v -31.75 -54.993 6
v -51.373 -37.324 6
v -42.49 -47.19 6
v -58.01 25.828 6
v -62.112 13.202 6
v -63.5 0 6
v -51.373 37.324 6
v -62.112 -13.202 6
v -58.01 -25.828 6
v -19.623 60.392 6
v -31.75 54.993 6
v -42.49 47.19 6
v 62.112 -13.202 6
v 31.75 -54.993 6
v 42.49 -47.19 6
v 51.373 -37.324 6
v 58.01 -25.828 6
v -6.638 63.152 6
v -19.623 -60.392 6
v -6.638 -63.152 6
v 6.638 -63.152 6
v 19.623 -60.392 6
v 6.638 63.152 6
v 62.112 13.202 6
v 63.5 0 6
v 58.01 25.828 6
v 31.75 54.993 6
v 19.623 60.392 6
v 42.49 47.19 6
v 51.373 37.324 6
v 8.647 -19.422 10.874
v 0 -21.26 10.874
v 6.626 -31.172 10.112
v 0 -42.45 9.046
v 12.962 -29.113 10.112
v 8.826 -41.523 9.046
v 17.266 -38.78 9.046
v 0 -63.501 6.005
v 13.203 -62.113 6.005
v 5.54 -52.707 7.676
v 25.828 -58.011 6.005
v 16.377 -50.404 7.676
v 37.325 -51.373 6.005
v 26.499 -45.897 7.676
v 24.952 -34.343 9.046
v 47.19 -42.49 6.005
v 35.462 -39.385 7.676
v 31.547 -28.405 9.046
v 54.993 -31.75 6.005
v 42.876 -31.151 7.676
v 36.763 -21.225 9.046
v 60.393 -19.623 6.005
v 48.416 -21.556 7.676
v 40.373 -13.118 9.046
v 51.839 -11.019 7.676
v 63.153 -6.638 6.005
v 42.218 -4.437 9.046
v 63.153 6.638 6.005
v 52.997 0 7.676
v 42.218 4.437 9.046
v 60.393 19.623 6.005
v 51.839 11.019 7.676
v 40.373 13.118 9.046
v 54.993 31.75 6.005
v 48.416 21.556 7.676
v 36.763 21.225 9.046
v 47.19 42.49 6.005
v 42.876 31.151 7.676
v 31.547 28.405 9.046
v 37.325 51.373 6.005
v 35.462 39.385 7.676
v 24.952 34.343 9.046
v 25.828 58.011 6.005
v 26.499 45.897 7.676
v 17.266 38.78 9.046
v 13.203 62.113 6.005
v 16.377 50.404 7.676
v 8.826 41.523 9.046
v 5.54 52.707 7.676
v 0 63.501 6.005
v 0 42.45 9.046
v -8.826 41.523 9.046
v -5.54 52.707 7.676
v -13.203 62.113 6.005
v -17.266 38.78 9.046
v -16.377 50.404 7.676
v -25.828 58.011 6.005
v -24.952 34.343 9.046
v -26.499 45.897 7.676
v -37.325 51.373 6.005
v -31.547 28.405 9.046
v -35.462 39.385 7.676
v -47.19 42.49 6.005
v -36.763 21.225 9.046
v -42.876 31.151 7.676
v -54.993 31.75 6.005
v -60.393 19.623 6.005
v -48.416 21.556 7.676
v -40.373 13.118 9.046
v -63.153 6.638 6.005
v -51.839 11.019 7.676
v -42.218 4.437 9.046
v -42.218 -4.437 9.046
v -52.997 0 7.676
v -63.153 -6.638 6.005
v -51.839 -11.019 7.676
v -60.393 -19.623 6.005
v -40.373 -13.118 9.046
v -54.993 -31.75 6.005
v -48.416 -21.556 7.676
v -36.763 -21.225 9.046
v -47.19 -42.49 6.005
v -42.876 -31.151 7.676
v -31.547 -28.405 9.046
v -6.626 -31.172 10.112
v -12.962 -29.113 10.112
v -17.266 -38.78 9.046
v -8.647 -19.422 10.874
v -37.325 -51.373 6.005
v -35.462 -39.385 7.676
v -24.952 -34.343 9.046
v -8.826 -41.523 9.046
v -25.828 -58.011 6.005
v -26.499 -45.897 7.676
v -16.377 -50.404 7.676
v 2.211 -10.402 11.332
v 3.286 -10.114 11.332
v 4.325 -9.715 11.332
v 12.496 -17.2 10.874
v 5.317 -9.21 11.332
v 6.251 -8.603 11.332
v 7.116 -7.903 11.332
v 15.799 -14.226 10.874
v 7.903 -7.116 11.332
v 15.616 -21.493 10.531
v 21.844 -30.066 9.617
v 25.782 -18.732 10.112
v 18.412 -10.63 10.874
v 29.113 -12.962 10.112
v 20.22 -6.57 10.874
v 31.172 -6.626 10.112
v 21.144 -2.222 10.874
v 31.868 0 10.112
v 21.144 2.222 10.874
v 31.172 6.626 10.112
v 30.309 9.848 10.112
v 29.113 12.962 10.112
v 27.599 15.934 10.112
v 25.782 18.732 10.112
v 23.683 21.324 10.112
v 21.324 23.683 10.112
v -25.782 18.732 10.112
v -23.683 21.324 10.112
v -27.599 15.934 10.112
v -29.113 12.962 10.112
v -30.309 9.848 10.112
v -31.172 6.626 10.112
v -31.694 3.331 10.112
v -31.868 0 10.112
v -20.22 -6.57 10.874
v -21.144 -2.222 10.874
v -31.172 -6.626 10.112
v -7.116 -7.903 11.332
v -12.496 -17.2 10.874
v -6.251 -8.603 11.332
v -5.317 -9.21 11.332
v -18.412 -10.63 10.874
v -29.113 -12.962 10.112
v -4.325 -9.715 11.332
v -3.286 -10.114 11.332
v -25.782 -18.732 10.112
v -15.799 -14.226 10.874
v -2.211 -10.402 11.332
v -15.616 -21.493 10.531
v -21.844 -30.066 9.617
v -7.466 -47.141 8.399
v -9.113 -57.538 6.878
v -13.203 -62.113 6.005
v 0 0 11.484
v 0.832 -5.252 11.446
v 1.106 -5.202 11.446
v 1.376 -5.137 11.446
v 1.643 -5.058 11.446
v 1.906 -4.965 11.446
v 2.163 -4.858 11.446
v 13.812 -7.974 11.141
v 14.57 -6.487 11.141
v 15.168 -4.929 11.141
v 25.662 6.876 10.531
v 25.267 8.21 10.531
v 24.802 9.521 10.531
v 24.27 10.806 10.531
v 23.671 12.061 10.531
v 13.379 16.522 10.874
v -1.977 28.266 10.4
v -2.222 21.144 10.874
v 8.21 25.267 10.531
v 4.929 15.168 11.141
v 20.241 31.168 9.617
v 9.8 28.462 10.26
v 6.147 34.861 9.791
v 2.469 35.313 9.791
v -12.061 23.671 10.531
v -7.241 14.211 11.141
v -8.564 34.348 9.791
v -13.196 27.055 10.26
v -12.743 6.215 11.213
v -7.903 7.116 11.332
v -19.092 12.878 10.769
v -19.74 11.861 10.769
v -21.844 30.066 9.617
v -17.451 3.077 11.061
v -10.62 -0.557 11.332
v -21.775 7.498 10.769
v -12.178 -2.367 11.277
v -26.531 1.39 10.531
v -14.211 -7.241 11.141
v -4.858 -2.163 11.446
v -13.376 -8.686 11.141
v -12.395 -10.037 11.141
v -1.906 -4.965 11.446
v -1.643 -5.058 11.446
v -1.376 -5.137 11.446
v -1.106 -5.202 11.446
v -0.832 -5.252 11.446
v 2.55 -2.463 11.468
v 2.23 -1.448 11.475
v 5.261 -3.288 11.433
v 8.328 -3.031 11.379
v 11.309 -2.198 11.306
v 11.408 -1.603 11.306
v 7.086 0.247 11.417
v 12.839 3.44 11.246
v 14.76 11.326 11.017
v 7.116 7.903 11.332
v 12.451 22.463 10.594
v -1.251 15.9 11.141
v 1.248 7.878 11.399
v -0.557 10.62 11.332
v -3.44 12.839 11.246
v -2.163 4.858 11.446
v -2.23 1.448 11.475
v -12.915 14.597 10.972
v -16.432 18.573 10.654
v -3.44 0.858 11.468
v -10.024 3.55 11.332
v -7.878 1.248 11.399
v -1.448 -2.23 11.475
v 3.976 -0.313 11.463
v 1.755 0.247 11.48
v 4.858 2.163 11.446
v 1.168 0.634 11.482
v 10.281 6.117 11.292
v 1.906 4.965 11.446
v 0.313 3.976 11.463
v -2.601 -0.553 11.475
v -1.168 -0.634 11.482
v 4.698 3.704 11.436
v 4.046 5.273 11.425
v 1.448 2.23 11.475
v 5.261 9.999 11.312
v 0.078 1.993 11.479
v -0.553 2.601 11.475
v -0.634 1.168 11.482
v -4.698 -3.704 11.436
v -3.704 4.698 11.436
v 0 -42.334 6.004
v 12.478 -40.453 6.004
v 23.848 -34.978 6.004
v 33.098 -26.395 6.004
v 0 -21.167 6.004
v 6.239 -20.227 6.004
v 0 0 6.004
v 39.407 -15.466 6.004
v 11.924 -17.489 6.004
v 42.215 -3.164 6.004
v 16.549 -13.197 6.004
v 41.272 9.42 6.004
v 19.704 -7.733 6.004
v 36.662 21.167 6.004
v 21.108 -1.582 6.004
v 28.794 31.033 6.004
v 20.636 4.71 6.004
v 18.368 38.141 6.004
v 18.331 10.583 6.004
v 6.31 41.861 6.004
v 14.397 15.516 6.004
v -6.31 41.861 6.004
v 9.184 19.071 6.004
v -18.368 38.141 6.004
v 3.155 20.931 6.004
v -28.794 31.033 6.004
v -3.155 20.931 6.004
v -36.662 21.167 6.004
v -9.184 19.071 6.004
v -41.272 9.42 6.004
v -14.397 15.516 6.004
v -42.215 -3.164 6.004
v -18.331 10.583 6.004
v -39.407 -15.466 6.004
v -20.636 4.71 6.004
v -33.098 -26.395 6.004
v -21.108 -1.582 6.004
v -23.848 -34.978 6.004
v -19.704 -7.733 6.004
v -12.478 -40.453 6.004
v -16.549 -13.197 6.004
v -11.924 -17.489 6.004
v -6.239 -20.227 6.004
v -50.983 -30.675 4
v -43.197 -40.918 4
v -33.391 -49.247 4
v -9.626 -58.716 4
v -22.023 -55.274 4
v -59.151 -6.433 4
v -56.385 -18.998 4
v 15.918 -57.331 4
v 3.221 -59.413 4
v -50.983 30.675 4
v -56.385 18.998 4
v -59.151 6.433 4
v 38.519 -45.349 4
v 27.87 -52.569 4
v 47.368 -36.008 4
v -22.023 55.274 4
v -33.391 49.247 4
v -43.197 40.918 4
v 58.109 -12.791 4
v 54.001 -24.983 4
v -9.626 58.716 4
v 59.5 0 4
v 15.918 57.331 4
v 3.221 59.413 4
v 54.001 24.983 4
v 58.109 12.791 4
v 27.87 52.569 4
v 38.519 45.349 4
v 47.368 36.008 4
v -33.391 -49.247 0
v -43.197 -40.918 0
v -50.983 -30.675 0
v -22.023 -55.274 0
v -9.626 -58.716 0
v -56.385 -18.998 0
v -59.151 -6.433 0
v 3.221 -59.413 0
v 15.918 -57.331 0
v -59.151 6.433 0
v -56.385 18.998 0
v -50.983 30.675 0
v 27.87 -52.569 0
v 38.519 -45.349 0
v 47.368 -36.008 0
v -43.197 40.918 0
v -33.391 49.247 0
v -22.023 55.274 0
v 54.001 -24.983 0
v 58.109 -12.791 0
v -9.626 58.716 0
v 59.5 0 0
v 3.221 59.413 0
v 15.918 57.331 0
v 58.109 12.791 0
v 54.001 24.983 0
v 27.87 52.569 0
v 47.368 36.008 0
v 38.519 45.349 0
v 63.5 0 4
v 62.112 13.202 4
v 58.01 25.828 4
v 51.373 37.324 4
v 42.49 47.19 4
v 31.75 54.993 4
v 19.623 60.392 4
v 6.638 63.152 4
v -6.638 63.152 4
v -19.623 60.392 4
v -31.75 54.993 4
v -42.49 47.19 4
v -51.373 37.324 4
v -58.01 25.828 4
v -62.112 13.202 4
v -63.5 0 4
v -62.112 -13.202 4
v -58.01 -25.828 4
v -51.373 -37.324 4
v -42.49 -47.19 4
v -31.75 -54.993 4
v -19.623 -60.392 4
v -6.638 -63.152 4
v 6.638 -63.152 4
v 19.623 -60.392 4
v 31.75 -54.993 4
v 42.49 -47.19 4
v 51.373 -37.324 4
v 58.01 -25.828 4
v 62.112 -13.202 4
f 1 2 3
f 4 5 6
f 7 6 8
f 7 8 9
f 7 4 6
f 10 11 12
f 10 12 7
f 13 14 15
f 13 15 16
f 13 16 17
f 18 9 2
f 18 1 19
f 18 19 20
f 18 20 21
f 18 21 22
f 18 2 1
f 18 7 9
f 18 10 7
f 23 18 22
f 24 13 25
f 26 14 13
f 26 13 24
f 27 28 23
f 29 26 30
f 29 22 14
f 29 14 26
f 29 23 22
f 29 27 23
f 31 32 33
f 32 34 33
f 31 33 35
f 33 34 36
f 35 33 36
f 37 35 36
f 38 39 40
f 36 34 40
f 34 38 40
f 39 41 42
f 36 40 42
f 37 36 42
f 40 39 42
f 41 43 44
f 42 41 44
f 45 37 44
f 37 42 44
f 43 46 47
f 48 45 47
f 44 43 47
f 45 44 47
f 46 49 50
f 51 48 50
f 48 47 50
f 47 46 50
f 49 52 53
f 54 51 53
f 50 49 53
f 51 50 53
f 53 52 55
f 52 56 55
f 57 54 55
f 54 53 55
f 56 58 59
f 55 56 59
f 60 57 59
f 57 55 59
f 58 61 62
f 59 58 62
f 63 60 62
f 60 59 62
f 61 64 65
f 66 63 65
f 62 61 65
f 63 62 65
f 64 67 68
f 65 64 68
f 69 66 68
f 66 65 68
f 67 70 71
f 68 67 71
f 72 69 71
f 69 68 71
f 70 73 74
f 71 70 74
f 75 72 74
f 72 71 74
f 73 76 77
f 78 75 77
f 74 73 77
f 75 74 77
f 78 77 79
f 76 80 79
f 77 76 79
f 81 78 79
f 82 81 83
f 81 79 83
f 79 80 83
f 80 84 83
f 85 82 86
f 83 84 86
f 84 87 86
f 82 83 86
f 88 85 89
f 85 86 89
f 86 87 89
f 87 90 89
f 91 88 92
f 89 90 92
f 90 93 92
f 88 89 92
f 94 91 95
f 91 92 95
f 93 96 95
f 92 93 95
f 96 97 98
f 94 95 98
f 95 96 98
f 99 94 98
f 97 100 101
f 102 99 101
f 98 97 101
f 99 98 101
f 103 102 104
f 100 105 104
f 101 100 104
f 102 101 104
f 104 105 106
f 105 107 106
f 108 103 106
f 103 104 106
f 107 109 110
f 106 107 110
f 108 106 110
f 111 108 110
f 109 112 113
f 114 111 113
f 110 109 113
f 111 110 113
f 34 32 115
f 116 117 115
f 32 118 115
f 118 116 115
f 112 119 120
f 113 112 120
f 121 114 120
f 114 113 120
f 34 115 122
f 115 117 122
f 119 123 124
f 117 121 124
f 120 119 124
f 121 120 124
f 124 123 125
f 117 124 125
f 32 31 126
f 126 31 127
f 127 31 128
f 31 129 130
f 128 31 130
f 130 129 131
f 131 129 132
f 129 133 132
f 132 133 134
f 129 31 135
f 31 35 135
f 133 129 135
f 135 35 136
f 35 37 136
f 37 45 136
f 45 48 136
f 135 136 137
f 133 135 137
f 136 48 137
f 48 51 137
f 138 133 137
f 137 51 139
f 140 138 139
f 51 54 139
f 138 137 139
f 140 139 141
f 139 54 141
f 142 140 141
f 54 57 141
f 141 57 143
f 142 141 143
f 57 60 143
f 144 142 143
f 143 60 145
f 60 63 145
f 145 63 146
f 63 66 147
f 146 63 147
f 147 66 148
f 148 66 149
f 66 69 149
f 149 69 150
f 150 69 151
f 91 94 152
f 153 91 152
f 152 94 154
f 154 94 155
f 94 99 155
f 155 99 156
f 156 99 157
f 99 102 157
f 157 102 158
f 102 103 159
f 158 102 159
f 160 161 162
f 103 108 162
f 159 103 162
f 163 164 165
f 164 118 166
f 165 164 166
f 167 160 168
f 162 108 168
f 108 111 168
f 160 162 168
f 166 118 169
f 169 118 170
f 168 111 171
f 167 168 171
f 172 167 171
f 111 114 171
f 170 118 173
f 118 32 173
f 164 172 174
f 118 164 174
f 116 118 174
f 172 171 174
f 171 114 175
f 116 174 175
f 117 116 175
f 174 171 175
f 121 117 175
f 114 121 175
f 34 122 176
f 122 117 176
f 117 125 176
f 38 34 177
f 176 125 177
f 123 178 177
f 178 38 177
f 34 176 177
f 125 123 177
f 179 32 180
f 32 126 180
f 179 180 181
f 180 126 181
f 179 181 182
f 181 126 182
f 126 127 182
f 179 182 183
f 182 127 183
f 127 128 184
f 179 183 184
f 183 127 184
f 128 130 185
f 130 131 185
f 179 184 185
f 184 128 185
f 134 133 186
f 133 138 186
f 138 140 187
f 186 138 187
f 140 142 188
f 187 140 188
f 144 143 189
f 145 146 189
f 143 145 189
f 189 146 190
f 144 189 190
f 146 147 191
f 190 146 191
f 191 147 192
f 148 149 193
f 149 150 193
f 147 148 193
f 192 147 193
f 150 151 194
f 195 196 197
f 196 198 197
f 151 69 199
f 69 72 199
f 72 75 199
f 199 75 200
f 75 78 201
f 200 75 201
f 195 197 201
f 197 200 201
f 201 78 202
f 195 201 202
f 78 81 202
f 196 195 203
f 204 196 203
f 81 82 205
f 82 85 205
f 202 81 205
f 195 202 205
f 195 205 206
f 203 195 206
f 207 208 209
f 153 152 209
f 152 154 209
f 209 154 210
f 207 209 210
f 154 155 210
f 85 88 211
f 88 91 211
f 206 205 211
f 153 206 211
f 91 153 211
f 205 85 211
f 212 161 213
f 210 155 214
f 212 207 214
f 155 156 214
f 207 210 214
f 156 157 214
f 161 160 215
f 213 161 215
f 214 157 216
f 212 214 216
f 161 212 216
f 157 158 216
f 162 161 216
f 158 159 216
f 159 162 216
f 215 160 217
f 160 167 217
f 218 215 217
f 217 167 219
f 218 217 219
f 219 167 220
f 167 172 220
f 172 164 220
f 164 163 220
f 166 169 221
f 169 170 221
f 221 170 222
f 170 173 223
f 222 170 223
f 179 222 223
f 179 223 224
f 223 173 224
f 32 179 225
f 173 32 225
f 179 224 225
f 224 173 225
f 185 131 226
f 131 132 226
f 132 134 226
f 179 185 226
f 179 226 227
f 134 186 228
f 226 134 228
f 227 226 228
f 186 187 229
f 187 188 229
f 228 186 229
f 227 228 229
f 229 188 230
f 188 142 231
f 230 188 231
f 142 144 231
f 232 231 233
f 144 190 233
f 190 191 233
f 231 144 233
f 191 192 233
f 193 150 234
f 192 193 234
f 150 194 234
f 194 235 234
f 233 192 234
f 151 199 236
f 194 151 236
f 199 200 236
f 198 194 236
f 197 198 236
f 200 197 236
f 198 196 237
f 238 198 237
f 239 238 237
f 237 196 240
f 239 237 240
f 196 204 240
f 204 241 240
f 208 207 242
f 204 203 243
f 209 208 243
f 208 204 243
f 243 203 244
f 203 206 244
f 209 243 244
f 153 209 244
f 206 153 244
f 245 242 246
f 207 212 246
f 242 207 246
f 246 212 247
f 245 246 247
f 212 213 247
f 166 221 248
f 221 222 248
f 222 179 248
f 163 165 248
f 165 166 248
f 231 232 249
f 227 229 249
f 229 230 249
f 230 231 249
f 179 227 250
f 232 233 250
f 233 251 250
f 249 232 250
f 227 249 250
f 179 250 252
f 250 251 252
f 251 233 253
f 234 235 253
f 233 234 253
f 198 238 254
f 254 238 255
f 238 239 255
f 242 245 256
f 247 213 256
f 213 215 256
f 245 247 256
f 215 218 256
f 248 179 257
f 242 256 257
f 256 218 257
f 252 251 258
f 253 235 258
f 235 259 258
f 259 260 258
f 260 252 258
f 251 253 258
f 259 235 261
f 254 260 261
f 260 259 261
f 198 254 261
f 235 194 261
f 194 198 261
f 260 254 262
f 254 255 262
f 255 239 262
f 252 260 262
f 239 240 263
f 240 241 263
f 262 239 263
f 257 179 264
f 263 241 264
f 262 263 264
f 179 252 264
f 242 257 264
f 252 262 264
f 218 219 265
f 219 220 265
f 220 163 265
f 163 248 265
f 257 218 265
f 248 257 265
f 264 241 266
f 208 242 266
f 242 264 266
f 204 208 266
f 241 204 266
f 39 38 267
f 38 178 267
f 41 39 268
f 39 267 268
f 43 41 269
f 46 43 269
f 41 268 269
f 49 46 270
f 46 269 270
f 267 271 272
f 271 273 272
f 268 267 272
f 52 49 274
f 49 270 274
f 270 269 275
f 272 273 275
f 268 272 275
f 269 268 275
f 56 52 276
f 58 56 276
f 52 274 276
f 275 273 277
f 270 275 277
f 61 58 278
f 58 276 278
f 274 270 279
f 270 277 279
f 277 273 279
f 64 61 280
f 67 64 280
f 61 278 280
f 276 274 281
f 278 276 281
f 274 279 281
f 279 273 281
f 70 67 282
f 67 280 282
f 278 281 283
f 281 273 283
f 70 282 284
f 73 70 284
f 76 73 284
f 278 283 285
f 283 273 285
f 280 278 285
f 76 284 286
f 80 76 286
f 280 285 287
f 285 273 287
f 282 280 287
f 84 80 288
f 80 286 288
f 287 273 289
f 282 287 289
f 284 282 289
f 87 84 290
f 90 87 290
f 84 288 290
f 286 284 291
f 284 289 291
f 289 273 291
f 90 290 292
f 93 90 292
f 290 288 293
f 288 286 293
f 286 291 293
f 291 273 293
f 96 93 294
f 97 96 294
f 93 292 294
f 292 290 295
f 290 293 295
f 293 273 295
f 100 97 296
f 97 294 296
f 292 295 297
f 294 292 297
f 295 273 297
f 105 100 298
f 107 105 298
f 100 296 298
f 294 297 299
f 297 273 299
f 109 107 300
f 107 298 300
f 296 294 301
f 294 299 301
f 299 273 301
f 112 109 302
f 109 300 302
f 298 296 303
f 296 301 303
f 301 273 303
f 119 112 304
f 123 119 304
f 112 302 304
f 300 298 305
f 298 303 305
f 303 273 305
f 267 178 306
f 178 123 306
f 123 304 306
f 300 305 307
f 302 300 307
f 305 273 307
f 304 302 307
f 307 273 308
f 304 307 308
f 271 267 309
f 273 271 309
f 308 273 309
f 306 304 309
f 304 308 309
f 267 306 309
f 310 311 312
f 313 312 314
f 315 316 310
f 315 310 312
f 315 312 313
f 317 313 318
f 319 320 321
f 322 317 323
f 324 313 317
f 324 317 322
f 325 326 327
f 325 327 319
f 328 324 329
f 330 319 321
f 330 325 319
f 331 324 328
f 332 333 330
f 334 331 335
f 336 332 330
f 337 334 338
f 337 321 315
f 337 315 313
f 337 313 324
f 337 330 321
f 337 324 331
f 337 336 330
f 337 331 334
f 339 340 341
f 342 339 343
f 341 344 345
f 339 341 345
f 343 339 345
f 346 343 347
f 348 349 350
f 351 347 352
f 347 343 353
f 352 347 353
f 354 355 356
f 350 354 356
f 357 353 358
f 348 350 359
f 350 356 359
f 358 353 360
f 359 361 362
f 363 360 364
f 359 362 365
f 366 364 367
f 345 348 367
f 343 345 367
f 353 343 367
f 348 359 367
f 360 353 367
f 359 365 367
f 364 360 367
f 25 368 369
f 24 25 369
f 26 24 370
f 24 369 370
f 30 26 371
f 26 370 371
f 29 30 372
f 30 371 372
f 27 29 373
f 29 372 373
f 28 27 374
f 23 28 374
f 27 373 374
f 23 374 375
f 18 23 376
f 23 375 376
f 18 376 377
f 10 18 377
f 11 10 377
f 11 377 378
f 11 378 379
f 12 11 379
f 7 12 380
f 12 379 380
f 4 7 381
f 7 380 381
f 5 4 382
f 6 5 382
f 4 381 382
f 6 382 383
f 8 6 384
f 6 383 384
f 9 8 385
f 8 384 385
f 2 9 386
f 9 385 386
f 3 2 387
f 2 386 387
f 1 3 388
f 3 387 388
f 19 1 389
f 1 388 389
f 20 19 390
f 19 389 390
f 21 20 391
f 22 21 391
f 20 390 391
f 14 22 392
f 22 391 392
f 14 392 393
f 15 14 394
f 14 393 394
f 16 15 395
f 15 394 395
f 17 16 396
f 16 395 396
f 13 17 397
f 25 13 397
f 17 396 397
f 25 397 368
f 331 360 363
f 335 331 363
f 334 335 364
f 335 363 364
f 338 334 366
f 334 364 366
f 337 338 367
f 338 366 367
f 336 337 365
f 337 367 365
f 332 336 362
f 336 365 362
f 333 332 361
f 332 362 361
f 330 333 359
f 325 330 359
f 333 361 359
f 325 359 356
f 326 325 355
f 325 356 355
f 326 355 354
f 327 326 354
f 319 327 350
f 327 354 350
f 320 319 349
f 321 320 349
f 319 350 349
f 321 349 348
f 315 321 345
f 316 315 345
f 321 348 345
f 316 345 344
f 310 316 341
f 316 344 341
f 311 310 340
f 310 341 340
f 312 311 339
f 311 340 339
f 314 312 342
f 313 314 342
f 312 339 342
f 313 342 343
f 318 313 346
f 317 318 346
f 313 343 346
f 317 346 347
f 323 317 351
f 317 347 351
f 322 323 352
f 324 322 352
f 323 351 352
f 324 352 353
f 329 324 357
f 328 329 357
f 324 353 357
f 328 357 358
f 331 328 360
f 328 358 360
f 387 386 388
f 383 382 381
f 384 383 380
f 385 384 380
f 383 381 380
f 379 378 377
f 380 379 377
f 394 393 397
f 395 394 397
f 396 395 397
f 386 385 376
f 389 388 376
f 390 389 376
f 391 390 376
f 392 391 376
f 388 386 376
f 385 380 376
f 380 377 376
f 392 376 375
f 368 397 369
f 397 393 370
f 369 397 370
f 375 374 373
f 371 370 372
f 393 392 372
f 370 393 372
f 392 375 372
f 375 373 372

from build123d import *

# Parameters (mm, degrees)
F0_R     = 59.5
F1_DEPTH = 4
F2_START = 4
F0_R_2   = 63.5
F2_DEPTH = 2


with BuildPart() as f1:
    # F0 (on Top) → F1 (new body)
    with BuildSketch(Plane.XY):
        Circle(F0_R)
    extrude(amount=F1_DEPTH)


with BuildPart() as f2:
    # F0 (on Top) → F2 (new body)
    with BuildSketch(Plane.XY.offset(F2_START)):
        Circle(F0_R_2)
        Circle(F0_R, mode=Mode.SUBTRACT)
        Circle(F0_R)
    extrude(amount=F2_DEPTH)


with BuildPart() as f4:
    # F3 (on Right) → F4 (revolve)
    with BuildSketch(Plane.YZ):
        with BuildLine():
            Line((0, 6.0036913461), (0, 11.4844598427))
            ThreePointArc((0, 11.4844598427), (-31.8684052127, 10.1122485047), (-63.5007694364, 6.0047251172))
            Line((-63.5007694364, 6.0047251172), (0, 6.0036913461))
        make_face()
    revolve(axis=Axis((0, 0, 16.208153218), (0, 0, 1)))


solid = Compound([f1.part, f2.part, f4.part])
